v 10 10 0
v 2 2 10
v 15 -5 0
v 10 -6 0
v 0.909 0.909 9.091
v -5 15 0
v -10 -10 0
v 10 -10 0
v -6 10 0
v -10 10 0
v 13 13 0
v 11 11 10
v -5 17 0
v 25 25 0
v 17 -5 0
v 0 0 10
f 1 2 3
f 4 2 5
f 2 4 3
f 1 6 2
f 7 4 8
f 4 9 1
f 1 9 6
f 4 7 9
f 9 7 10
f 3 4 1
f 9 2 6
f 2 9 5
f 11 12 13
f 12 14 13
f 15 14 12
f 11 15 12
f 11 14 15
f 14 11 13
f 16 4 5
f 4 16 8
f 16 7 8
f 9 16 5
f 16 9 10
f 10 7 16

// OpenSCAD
polyhedron(
  points=[ [10,10,0],[10,-10,0],[-10,-10,0],[-10,10,0], // the four points at base
           [0,0,10]  ],                                 // the apex point 
  faces=[ [0,1,4],[1,2,4],[2,3,4],[3,0,4],              // each triangle side
              [1,0,3],[2,1,3] ]                         // two triangles for square base
 );


module segmentA(x,y,z) {
  // x,y and z define the start positions of the segment's construction.
   polyhedron(
     points=[ 
        //0: middle bottom middle
        [2+x,2+y,0+z],
        //1: side middle 1
        [15+x,-5+y,0+z],
        //2: upwards tip
        [-10+x,-10+y,0+z],
        //3: side middle 2 (x1 = y2, x2=y1, to keep proportions)
        [-5+x,15+y,0+z],
        //4: upwards top point
        [2+x,2+y,10+z],
        //5: downwards tip
        [10+x,10+y,0+z]
      ],
     faces=[ 
      // connect the points given with a face. the order is important. the GSC geometry system won't properly render it
      // if the order is out of sync. luckily with only 3 points I could shuffle it around till it worked hehe.
      // But the overall idea is that there's an order for a face to be constructed in. so a face is valid if you connect A to B to C
      // but invalid if you do it in the wrong direction, like A to C to B.
        [5,1,4],
        [1,2,4],
        [2,3,4],
        [3,5,4],
        [5,3,0],
        [5,0,1],  // example -> [5,1,0] won't generate a face when rendering the model completely.
        [0,3,2],
        [0,2,1] 
      ]
   );
 }; 
 
 
 module segmentB(x,y,z) {
  // x,y and z define the start positions of this segment's construction.

  polyhedron(
     points=[ 
       [-3+x,-3+y,0+z],
       [15+x,-7+y,0+z],
       [-15+x,-15+y,0+z],
       [-7+x,15+y,0+z], 
       [-1+x,-1+y,10+z]
      ],                                
     faces=[ 
       [0,1,4],
       [1,2,4],
       [2,3,4],
       [3,0,4], 
       [0,3,2],
       [0,2,1] 
      ]                         
  );
 }; 




module EthereumLogo(x=0,y=0,z=0){
segmentA(0+x,0+y,0+z);
 
rotate([0,0,180]) 
segmentB(-10+x,-10+y,0+z);
}


EthereumLogo();
